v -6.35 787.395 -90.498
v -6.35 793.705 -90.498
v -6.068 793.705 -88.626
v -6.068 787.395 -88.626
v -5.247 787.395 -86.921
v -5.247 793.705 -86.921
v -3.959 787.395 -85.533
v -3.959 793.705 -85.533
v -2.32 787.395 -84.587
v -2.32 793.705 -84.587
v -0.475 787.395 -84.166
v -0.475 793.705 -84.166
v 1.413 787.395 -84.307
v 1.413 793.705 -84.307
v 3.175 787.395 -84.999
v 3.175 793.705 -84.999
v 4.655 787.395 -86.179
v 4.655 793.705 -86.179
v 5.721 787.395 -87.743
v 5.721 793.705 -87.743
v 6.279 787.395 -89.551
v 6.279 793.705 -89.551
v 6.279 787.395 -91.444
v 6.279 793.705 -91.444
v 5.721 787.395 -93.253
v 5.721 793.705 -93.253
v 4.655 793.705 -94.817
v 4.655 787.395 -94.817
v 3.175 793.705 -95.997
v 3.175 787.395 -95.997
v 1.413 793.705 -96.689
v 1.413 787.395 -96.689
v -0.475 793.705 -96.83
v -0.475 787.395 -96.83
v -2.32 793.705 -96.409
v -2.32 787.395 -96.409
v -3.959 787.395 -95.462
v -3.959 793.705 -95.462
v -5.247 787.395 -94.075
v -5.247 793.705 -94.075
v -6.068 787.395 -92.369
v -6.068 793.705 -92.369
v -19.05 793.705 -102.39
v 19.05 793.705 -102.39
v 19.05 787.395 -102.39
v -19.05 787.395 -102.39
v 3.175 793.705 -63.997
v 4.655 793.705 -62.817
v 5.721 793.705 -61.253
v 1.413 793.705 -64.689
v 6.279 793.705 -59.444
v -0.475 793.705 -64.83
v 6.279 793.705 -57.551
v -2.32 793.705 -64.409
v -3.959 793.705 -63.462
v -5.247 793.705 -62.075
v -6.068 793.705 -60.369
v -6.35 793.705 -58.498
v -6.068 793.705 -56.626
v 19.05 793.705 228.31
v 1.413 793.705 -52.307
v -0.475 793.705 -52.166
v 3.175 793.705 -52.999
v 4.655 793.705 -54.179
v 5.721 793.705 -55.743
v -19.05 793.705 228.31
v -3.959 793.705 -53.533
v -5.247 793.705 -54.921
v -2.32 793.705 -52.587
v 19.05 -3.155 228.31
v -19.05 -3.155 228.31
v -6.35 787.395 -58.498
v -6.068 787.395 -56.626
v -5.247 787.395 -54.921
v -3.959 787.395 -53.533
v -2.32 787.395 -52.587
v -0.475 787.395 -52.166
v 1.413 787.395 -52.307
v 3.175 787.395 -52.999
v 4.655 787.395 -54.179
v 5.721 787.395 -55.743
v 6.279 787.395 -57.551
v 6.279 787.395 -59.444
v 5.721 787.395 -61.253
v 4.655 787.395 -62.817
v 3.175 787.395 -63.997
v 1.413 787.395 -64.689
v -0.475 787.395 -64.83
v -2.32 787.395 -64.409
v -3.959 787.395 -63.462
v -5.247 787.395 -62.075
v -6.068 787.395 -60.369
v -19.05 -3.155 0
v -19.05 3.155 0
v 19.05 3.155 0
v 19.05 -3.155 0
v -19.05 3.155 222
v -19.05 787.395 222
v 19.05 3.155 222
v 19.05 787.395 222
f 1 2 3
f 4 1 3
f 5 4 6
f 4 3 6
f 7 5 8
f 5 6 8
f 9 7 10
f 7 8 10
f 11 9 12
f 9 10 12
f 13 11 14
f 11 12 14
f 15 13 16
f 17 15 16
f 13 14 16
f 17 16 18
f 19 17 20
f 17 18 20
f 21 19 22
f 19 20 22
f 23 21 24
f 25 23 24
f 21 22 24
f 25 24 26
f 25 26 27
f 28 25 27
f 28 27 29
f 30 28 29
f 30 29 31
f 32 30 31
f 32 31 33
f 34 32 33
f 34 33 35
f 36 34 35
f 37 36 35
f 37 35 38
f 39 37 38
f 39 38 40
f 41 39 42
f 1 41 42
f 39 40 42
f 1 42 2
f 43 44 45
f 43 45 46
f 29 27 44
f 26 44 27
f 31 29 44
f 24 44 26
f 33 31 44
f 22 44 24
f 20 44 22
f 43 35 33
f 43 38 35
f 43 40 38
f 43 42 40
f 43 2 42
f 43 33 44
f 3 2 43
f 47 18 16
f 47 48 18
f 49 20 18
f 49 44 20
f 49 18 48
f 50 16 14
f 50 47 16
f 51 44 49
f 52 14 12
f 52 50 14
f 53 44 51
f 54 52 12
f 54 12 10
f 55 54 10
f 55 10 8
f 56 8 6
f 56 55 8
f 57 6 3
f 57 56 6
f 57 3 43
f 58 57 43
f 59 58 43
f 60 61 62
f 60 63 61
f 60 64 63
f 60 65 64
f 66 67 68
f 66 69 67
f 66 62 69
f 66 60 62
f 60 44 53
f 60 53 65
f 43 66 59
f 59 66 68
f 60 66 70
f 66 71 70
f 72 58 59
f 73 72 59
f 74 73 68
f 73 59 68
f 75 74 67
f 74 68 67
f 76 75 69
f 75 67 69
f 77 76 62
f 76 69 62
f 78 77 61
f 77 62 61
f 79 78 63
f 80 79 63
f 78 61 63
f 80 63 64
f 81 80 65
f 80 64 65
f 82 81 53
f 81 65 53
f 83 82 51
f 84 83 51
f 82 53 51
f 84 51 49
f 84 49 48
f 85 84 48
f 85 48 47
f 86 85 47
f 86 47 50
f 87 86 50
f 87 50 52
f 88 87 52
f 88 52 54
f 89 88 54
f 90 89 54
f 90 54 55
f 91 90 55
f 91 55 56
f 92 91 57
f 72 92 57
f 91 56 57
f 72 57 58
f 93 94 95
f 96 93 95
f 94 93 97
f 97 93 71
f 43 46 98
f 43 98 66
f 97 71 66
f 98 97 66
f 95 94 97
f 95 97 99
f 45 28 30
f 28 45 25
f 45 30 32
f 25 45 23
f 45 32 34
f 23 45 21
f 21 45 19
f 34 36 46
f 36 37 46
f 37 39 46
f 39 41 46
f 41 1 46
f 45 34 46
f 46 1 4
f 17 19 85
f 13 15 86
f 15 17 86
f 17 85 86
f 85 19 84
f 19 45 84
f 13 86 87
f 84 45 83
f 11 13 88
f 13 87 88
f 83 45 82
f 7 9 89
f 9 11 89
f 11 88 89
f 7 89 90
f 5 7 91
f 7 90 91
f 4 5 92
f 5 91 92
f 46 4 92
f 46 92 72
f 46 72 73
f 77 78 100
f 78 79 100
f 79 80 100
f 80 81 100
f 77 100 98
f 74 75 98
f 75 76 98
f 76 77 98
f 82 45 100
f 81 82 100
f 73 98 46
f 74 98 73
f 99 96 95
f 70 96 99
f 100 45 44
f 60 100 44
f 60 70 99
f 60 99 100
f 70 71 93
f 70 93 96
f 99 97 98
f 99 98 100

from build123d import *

# Parameters (mm, degrees)
CROQUIS1_W              = 38.1
CROQUIS1_H              = 6.31
SALIENTE_EXTRUIR1_DEPTH = 228.31
CROQUIS2_W              = 38.1
CROQUIS2_H              = 6.31
SALIENTE_EXTRUIR2_DEPTH = 790.55
CROQUIS3_W              = 38.1
CROQUIS3_H              = 6.31
SALIENTE_EXTRUIR3_DEPTH = 324.39
CROQUIS4_R              = 6.35
CORTAR_EXTRUIR1_DEPTH   = 6.31


with BuildPart() as part:
    # Croquis1 → Saliente-Extruir1 (new body)
    with BuildSketch(Plane.XY):
        Rectangle(CROQUIS1_W, CROQUIS1_H)
    extrude(amount=SALIENTE_EXTRUIR1_DEPTH)

    # Croquis2 → Saliente-Extruir2 (add)
    with BuildSketch(Plane(origin=(0, 3.155, 0), x_dir=(1, 0, 0), z_dir=(0, 1, 0))):
        with Locations((0, -225.155)):
            Rectangle(CROQUIS2_W, CROQUIS2_H)
    extrude(amount=SALIENTE_EXTRUIR2_DEPTH)

    # Croquis3 → Saliente-Extruir3 (add)
    with BuildSketch(Plane(origin=(0, 0, 222), x_dir=(-1, 0, 0), z_dir=(0, 0, -1))):
        with Locations((0, 790.55)):
            Rectangle(CROQUIS3_W, CROQUIS3_H)
    extrude(amount=SALIENTE_EXTRUIR3_DEPTH)

    # Croquis4 → Cortar-Extruir1 (cut)
    with BuildSketch(Plane(origin=(0, 793.705, 0), x_dir=(1, 0, 0), z_dir=(0, 1, 0))):
        with Locations(Location((0, 90.497795334, 0), (0, 0, 180))):
            Circle(CROQUIS4_R)
        with Locations(Location((0, 58.497795334, 0), (0, 0, 180))):
            Circle(CROQUIS4_R)
    extrude(amount=-CORTAR_EXTRUIR1_DEPTH, mode=Mode.SUBTRACT)


solid = part.part
